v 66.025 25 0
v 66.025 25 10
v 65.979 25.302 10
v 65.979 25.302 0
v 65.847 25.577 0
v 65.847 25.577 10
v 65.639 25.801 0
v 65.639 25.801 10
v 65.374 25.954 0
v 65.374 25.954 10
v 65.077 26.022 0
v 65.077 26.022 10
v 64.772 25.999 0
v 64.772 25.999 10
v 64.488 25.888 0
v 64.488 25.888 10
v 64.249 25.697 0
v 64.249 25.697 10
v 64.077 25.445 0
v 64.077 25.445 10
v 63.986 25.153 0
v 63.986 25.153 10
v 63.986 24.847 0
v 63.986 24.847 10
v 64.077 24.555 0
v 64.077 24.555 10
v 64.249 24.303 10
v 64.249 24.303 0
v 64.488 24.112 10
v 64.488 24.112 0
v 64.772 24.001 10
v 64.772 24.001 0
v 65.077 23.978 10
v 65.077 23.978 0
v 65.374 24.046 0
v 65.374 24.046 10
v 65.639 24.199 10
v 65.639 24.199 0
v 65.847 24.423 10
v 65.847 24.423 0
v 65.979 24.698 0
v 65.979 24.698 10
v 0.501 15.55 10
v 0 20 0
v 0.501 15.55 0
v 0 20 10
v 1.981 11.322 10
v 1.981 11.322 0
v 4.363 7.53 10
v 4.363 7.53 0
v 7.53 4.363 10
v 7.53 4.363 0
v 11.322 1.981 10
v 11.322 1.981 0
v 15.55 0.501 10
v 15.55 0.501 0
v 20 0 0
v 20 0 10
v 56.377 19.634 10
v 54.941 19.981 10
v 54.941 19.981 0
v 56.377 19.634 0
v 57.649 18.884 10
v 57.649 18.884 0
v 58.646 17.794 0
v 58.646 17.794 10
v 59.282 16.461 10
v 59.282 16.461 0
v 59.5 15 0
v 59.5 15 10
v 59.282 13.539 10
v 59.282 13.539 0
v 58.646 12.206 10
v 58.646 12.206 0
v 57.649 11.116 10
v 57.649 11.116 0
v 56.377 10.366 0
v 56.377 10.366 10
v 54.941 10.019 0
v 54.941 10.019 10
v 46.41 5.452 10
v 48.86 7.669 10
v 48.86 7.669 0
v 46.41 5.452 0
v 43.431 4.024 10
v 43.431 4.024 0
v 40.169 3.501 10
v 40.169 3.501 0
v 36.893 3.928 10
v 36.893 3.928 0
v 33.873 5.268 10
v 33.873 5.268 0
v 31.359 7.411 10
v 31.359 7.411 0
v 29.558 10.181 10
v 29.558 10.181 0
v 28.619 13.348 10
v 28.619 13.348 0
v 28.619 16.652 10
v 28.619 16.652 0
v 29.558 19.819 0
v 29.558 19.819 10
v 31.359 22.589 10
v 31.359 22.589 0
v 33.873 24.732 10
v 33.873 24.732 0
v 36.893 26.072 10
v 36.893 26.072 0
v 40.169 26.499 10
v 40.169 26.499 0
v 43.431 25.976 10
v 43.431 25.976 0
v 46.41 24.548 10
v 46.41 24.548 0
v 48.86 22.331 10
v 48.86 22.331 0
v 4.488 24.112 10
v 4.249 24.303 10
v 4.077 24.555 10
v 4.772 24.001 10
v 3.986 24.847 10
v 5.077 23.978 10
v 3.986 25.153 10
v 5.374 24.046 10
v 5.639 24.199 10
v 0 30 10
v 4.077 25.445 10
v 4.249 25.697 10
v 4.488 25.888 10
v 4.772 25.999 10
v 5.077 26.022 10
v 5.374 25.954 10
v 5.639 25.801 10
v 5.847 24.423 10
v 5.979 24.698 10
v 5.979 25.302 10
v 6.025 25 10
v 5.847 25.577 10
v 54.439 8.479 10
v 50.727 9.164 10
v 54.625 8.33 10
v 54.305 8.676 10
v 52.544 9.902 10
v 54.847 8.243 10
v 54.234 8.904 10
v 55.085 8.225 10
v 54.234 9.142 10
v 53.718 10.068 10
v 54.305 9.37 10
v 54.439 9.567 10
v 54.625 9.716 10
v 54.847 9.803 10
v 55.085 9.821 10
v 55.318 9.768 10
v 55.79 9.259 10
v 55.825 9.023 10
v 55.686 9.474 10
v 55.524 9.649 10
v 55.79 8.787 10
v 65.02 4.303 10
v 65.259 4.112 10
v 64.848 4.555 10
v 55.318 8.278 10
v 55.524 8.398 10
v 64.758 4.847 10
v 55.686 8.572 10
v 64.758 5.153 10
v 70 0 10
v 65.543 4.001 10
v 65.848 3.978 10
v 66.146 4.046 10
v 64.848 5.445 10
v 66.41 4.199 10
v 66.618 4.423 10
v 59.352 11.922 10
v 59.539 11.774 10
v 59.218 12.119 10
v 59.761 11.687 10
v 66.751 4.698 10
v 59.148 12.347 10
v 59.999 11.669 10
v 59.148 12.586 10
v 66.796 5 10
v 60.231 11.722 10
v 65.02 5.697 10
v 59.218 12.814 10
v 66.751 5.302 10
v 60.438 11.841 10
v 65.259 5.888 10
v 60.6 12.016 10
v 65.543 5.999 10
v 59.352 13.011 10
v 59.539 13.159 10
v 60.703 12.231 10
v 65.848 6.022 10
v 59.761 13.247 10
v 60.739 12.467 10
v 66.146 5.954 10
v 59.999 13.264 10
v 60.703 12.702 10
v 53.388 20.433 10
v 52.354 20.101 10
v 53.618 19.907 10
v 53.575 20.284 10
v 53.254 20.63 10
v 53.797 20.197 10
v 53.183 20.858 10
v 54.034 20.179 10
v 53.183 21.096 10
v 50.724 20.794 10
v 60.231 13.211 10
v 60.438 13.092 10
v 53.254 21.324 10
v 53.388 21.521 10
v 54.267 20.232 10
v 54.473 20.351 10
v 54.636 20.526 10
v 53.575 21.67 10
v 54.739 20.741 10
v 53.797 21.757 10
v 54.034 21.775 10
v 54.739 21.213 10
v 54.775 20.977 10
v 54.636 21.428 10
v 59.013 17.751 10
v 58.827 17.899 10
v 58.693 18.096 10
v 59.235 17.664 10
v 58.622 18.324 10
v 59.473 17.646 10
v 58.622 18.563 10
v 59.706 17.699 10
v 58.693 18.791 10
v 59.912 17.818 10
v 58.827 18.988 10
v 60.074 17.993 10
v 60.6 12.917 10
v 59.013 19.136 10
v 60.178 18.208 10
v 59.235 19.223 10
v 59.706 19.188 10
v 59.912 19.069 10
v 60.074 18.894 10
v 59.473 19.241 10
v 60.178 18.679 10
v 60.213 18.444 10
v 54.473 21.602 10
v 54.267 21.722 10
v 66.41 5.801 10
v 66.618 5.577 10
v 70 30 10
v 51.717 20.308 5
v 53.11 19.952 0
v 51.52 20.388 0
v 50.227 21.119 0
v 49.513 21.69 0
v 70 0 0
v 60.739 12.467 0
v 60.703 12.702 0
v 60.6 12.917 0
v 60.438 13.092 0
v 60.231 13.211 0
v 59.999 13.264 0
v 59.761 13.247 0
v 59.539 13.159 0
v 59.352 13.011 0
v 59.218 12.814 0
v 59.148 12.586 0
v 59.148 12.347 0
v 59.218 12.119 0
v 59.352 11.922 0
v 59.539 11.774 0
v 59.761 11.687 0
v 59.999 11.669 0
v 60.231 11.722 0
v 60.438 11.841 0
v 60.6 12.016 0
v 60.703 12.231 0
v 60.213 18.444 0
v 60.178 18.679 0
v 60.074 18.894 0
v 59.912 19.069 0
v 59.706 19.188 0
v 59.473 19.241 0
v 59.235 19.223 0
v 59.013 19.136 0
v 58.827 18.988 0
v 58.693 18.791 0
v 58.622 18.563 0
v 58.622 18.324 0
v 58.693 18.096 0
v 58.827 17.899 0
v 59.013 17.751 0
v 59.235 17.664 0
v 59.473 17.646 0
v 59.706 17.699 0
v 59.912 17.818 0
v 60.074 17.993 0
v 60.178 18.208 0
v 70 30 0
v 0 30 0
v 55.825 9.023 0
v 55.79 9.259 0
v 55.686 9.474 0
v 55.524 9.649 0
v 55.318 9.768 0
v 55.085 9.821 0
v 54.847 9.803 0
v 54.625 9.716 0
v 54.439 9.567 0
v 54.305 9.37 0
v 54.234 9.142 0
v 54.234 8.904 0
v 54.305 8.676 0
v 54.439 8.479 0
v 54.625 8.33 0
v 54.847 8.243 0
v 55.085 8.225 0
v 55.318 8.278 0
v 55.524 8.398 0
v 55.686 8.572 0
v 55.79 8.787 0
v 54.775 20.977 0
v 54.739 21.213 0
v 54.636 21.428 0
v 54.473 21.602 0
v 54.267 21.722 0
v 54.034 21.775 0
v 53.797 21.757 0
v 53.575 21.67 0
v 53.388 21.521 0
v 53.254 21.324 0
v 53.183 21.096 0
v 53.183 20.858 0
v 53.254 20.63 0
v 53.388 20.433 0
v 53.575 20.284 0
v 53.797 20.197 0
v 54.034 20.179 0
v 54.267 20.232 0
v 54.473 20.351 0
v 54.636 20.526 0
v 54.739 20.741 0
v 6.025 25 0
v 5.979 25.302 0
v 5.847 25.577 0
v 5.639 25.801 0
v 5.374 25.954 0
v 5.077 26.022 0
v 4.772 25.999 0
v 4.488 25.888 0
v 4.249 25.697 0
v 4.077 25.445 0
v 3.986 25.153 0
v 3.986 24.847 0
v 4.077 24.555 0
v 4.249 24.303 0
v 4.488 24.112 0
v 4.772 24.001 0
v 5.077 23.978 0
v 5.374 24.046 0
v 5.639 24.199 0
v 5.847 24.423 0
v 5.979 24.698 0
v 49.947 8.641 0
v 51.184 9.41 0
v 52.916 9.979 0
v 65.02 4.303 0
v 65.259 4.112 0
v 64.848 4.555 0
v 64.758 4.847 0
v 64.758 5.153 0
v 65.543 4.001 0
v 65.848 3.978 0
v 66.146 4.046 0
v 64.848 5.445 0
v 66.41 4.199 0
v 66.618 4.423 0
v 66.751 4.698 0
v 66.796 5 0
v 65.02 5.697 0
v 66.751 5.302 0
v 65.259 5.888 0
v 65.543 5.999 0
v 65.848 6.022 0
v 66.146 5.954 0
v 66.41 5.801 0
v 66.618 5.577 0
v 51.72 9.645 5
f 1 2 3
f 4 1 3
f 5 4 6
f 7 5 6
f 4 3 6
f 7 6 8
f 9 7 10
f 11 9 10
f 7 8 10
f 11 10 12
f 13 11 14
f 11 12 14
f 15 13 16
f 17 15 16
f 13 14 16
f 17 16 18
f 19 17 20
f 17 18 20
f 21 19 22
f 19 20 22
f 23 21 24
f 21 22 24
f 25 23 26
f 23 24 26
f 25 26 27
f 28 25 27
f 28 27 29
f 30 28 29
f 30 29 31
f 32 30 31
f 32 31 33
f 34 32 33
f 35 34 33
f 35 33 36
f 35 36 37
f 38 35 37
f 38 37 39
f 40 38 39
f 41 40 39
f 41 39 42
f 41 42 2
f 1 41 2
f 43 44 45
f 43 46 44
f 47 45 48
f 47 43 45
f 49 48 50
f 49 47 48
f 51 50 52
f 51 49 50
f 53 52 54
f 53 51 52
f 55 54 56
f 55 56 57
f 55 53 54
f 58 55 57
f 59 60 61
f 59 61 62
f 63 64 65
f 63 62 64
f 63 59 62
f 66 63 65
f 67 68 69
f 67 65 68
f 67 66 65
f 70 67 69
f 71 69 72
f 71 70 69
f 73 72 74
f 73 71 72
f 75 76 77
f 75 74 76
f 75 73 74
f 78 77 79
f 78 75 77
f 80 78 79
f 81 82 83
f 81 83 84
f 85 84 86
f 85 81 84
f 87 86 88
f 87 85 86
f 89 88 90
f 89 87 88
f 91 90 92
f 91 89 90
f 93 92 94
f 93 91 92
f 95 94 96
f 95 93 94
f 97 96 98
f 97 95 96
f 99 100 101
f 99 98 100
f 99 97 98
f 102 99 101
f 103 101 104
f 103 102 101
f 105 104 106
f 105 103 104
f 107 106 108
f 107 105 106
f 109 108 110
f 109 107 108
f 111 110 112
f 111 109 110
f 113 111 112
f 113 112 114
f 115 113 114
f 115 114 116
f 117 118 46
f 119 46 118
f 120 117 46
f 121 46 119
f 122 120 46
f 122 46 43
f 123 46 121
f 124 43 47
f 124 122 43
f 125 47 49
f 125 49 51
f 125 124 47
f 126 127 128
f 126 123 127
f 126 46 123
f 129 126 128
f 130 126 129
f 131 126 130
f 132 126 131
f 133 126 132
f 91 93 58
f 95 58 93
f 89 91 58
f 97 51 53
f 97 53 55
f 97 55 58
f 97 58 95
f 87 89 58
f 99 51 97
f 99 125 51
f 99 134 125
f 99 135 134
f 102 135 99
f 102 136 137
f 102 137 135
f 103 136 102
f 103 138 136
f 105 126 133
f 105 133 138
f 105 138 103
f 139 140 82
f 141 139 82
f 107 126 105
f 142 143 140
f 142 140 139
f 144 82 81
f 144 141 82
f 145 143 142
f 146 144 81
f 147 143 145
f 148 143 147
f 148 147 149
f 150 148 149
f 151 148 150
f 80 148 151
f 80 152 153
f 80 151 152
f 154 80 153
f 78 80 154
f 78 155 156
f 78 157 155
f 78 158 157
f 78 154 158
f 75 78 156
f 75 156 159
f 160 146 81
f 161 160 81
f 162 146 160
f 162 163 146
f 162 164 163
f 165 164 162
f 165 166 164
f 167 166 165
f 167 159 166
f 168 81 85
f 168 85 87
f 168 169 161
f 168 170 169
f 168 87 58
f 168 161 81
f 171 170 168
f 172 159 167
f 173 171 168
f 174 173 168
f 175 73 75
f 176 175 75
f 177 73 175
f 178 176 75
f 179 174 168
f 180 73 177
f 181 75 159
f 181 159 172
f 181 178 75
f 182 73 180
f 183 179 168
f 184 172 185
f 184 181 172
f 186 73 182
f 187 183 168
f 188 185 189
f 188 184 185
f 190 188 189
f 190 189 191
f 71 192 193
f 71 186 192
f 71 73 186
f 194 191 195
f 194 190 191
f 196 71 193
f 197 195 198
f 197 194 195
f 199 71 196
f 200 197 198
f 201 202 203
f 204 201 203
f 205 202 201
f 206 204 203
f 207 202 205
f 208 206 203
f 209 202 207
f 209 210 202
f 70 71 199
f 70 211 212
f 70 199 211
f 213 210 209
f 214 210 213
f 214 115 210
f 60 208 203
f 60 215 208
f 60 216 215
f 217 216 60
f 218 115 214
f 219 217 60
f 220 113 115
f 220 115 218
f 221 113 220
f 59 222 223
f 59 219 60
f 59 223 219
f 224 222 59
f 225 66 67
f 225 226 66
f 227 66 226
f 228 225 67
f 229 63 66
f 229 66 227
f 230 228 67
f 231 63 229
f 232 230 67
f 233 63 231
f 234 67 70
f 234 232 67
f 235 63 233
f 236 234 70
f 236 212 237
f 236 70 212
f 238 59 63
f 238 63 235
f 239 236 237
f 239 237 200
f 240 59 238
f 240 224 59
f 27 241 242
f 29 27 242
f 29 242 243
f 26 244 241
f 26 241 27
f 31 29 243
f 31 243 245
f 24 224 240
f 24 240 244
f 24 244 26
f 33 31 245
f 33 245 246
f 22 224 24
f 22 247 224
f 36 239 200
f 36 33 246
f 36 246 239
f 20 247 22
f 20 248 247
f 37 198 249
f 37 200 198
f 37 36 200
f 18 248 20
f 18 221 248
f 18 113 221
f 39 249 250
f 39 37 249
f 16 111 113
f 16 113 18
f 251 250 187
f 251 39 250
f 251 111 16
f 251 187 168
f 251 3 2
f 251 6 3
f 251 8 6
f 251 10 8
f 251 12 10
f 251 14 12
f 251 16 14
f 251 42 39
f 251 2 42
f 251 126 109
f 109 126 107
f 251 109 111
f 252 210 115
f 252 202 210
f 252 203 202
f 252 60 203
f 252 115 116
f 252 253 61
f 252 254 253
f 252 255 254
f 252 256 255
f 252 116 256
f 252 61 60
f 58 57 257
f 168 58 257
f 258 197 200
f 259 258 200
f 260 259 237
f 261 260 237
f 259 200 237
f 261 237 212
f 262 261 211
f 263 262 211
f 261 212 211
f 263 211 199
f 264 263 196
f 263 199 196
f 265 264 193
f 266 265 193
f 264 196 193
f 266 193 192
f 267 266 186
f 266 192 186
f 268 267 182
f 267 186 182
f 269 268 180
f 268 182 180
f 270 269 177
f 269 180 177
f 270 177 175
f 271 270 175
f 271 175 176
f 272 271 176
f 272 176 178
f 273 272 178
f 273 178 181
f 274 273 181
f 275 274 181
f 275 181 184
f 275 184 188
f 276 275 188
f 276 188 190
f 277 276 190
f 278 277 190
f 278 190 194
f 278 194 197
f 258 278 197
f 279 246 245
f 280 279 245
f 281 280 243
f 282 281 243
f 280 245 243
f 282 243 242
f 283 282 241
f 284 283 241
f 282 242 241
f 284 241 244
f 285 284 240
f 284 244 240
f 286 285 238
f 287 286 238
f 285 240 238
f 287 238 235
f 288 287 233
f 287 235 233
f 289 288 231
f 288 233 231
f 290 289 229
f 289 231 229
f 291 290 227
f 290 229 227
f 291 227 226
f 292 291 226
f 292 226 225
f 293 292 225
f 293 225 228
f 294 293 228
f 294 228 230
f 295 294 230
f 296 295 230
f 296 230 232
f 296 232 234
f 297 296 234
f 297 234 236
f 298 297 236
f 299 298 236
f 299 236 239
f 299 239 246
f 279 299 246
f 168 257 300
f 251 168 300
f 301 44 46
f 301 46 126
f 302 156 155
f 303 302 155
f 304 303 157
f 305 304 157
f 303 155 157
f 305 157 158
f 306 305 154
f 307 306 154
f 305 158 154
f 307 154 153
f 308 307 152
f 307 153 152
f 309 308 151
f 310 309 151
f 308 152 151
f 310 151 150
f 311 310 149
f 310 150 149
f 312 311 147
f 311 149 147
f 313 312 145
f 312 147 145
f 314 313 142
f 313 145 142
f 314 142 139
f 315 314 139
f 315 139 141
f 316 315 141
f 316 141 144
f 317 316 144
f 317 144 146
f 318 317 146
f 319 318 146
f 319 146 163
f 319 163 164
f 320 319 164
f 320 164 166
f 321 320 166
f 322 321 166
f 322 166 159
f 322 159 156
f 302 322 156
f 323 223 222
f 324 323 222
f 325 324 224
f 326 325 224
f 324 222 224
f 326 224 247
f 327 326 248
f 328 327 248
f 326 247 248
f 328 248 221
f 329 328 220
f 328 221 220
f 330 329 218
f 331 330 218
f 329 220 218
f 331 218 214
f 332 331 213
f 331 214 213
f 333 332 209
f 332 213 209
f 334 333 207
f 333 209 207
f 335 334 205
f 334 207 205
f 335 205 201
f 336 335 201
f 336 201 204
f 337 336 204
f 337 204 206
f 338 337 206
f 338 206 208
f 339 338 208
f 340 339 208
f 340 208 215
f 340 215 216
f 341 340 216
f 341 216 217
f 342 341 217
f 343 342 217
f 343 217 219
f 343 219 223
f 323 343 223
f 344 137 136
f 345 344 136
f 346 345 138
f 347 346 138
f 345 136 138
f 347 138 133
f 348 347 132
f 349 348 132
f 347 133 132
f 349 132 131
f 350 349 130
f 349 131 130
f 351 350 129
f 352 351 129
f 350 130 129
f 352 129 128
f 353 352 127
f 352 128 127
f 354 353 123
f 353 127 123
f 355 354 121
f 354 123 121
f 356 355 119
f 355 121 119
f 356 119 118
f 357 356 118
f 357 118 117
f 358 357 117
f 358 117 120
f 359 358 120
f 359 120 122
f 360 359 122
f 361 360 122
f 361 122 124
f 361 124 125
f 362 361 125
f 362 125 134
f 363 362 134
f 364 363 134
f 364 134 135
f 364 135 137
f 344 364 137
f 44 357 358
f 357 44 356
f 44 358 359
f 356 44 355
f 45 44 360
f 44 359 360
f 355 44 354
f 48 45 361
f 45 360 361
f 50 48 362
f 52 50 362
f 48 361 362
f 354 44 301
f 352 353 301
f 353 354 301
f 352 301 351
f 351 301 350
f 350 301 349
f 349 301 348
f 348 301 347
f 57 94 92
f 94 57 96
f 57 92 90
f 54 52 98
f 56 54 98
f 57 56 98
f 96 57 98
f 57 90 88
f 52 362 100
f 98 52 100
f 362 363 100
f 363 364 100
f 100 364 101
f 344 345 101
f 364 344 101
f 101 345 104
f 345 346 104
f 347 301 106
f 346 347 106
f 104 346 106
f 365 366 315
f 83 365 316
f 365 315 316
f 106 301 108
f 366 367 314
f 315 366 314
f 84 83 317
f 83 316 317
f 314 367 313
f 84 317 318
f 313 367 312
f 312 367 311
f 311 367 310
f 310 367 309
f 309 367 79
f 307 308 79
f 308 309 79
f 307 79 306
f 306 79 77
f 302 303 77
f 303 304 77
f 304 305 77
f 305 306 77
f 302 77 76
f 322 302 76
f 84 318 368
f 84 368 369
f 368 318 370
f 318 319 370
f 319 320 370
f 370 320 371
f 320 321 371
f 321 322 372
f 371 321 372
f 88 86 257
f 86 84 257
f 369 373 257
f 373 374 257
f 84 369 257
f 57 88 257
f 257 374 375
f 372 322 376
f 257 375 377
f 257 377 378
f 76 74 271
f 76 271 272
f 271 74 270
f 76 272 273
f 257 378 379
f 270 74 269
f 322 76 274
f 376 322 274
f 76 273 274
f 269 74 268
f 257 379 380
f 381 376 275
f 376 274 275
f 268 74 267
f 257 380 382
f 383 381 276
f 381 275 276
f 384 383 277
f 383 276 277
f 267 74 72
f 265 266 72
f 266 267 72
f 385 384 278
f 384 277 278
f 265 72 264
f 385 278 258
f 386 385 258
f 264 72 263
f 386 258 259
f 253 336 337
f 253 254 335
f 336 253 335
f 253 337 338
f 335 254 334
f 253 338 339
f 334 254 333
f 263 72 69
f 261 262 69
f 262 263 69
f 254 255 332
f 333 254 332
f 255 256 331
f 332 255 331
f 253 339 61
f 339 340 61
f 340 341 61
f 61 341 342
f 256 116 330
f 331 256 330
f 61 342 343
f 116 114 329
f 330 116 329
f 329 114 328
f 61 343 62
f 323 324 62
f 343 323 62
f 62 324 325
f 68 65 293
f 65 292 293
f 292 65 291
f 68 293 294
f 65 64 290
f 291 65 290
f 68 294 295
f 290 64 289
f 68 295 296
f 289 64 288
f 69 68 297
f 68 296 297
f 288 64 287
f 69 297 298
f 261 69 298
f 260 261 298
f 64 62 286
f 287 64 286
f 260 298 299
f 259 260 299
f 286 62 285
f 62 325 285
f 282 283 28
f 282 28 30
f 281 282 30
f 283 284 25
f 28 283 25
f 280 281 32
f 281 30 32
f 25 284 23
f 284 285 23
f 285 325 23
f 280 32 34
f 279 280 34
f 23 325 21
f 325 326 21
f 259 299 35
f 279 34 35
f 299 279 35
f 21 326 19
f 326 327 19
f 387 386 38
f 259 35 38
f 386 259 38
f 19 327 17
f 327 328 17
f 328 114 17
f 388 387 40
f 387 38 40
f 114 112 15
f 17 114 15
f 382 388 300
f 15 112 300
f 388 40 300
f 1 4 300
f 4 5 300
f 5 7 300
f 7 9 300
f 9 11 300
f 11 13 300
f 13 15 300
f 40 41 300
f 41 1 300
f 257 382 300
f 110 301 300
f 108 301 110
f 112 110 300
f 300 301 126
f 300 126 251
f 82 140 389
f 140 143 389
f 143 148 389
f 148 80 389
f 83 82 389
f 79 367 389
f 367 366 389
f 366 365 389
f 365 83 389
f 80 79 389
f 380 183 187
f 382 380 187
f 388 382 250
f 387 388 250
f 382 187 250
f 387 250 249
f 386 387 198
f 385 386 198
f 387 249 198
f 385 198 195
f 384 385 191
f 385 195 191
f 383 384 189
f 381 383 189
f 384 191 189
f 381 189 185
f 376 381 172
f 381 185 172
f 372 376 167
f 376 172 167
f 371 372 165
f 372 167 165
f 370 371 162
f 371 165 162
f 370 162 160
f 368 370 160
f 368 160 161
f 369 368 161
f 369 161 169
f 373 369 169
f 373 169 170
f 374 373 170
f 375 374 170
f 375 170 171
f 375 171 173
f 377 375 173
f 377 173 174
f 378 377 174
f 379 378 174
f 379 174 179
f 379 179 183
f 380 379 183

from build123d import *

# Parameters (mm, degrees)
ESQUISSE1_W             = 70
ESQUISSE1_H             = 30
BOSS_EXTRU_1_DEPTH      = 10
ESQUISSE2_R             = 0.8
ENL_V_MAT_EXTRU_1_DEPTH = 77.811457479
ESQUISSE3_R             = 1.025
ENL_V_MAT_EXTRU_2_DEPTH = 77.811457622
CONG_2_R                = 20


with BuildPart() as part:
    # Esquisse1 → Boss.-Extru.1 (new body)
    with BuildSketch(Plane.XY):
        with Locations((35, 15)):
            Rectangle(ESQUISSE1_W, ESQUISSE1_H)
    extrude(amount=BOSS_EXTRU_1_DEPTH)

    # Esquisse2 → Enlèv. mat.-Extru.1 (cut, through all)
    with BuildSketch(Plane.XY.offset(10)):
        with Locations((53.974554028, 20.976947928)):
            Circle(ESQUISSE2_R)
        with Locations((59.413465757, 18.443523524)):
            Circle(ESQUISSE2_R)
        with Locations((59.938911728, 12.466575596)):
            Circle(ESQUISSE2_R)
        with Locations((55.025445972, 9.023052072)):
            Circle(ESQUISSE2_R)
        with BuildLine():
            ThreePointArc((54.940833126, 19.980528702), (59.5, 15), (54.940833126, 10.019471298))
            add(Edge.make_bspline(
                [(48.86, 7.668533571), (51.540343022, 10.446024006), (54.940833126, 10.019471298)],
                knots=[0, 0, 0, 1, 1, 1], degree=2))
            ThreePointArc((48.86, 7.668533571), (28.5, 15), (48.86, 22.331466429))
            add(Edge.make_bspline(
                [(48.86, 22.331466429), (51.534478996, 19.459310032), (54.940833126, 19.980528702)],
                knots=[0, 0, 0, 1, 1, 1], degree=2))
        make_face()
    extrude(amount=-ENL_V_MAT_EXTRU_1_DEPTH, mode=Mode.SUBTRACT)

    # Esquisse3 → Enlèv. mat.-Extru.2 (cut, through all)
    with BuildSketch(Plane.XY.offset(10)):
        with Locations((5, 25)):
            Circle(ESQUISSE3_R)
        with Locations((65.771138483, 5)):
            Circle(ESQUISSE3_R)
        with Locations((65, 25)):
            Circle(ESQUISSE3_R)
    extrude(amount=-ENL_V_MAT_EXTRU_2_DEPTH, mode=Mode.SUBTRACT)

    # Congé2
    cong_2_edges = [part.edges().sort_by_distance(p)[0] for p in [
        (0, 0, 5),
    ]]
    fillet(cong_2_edges, radius=CONG_2_R)


solid = part.part
